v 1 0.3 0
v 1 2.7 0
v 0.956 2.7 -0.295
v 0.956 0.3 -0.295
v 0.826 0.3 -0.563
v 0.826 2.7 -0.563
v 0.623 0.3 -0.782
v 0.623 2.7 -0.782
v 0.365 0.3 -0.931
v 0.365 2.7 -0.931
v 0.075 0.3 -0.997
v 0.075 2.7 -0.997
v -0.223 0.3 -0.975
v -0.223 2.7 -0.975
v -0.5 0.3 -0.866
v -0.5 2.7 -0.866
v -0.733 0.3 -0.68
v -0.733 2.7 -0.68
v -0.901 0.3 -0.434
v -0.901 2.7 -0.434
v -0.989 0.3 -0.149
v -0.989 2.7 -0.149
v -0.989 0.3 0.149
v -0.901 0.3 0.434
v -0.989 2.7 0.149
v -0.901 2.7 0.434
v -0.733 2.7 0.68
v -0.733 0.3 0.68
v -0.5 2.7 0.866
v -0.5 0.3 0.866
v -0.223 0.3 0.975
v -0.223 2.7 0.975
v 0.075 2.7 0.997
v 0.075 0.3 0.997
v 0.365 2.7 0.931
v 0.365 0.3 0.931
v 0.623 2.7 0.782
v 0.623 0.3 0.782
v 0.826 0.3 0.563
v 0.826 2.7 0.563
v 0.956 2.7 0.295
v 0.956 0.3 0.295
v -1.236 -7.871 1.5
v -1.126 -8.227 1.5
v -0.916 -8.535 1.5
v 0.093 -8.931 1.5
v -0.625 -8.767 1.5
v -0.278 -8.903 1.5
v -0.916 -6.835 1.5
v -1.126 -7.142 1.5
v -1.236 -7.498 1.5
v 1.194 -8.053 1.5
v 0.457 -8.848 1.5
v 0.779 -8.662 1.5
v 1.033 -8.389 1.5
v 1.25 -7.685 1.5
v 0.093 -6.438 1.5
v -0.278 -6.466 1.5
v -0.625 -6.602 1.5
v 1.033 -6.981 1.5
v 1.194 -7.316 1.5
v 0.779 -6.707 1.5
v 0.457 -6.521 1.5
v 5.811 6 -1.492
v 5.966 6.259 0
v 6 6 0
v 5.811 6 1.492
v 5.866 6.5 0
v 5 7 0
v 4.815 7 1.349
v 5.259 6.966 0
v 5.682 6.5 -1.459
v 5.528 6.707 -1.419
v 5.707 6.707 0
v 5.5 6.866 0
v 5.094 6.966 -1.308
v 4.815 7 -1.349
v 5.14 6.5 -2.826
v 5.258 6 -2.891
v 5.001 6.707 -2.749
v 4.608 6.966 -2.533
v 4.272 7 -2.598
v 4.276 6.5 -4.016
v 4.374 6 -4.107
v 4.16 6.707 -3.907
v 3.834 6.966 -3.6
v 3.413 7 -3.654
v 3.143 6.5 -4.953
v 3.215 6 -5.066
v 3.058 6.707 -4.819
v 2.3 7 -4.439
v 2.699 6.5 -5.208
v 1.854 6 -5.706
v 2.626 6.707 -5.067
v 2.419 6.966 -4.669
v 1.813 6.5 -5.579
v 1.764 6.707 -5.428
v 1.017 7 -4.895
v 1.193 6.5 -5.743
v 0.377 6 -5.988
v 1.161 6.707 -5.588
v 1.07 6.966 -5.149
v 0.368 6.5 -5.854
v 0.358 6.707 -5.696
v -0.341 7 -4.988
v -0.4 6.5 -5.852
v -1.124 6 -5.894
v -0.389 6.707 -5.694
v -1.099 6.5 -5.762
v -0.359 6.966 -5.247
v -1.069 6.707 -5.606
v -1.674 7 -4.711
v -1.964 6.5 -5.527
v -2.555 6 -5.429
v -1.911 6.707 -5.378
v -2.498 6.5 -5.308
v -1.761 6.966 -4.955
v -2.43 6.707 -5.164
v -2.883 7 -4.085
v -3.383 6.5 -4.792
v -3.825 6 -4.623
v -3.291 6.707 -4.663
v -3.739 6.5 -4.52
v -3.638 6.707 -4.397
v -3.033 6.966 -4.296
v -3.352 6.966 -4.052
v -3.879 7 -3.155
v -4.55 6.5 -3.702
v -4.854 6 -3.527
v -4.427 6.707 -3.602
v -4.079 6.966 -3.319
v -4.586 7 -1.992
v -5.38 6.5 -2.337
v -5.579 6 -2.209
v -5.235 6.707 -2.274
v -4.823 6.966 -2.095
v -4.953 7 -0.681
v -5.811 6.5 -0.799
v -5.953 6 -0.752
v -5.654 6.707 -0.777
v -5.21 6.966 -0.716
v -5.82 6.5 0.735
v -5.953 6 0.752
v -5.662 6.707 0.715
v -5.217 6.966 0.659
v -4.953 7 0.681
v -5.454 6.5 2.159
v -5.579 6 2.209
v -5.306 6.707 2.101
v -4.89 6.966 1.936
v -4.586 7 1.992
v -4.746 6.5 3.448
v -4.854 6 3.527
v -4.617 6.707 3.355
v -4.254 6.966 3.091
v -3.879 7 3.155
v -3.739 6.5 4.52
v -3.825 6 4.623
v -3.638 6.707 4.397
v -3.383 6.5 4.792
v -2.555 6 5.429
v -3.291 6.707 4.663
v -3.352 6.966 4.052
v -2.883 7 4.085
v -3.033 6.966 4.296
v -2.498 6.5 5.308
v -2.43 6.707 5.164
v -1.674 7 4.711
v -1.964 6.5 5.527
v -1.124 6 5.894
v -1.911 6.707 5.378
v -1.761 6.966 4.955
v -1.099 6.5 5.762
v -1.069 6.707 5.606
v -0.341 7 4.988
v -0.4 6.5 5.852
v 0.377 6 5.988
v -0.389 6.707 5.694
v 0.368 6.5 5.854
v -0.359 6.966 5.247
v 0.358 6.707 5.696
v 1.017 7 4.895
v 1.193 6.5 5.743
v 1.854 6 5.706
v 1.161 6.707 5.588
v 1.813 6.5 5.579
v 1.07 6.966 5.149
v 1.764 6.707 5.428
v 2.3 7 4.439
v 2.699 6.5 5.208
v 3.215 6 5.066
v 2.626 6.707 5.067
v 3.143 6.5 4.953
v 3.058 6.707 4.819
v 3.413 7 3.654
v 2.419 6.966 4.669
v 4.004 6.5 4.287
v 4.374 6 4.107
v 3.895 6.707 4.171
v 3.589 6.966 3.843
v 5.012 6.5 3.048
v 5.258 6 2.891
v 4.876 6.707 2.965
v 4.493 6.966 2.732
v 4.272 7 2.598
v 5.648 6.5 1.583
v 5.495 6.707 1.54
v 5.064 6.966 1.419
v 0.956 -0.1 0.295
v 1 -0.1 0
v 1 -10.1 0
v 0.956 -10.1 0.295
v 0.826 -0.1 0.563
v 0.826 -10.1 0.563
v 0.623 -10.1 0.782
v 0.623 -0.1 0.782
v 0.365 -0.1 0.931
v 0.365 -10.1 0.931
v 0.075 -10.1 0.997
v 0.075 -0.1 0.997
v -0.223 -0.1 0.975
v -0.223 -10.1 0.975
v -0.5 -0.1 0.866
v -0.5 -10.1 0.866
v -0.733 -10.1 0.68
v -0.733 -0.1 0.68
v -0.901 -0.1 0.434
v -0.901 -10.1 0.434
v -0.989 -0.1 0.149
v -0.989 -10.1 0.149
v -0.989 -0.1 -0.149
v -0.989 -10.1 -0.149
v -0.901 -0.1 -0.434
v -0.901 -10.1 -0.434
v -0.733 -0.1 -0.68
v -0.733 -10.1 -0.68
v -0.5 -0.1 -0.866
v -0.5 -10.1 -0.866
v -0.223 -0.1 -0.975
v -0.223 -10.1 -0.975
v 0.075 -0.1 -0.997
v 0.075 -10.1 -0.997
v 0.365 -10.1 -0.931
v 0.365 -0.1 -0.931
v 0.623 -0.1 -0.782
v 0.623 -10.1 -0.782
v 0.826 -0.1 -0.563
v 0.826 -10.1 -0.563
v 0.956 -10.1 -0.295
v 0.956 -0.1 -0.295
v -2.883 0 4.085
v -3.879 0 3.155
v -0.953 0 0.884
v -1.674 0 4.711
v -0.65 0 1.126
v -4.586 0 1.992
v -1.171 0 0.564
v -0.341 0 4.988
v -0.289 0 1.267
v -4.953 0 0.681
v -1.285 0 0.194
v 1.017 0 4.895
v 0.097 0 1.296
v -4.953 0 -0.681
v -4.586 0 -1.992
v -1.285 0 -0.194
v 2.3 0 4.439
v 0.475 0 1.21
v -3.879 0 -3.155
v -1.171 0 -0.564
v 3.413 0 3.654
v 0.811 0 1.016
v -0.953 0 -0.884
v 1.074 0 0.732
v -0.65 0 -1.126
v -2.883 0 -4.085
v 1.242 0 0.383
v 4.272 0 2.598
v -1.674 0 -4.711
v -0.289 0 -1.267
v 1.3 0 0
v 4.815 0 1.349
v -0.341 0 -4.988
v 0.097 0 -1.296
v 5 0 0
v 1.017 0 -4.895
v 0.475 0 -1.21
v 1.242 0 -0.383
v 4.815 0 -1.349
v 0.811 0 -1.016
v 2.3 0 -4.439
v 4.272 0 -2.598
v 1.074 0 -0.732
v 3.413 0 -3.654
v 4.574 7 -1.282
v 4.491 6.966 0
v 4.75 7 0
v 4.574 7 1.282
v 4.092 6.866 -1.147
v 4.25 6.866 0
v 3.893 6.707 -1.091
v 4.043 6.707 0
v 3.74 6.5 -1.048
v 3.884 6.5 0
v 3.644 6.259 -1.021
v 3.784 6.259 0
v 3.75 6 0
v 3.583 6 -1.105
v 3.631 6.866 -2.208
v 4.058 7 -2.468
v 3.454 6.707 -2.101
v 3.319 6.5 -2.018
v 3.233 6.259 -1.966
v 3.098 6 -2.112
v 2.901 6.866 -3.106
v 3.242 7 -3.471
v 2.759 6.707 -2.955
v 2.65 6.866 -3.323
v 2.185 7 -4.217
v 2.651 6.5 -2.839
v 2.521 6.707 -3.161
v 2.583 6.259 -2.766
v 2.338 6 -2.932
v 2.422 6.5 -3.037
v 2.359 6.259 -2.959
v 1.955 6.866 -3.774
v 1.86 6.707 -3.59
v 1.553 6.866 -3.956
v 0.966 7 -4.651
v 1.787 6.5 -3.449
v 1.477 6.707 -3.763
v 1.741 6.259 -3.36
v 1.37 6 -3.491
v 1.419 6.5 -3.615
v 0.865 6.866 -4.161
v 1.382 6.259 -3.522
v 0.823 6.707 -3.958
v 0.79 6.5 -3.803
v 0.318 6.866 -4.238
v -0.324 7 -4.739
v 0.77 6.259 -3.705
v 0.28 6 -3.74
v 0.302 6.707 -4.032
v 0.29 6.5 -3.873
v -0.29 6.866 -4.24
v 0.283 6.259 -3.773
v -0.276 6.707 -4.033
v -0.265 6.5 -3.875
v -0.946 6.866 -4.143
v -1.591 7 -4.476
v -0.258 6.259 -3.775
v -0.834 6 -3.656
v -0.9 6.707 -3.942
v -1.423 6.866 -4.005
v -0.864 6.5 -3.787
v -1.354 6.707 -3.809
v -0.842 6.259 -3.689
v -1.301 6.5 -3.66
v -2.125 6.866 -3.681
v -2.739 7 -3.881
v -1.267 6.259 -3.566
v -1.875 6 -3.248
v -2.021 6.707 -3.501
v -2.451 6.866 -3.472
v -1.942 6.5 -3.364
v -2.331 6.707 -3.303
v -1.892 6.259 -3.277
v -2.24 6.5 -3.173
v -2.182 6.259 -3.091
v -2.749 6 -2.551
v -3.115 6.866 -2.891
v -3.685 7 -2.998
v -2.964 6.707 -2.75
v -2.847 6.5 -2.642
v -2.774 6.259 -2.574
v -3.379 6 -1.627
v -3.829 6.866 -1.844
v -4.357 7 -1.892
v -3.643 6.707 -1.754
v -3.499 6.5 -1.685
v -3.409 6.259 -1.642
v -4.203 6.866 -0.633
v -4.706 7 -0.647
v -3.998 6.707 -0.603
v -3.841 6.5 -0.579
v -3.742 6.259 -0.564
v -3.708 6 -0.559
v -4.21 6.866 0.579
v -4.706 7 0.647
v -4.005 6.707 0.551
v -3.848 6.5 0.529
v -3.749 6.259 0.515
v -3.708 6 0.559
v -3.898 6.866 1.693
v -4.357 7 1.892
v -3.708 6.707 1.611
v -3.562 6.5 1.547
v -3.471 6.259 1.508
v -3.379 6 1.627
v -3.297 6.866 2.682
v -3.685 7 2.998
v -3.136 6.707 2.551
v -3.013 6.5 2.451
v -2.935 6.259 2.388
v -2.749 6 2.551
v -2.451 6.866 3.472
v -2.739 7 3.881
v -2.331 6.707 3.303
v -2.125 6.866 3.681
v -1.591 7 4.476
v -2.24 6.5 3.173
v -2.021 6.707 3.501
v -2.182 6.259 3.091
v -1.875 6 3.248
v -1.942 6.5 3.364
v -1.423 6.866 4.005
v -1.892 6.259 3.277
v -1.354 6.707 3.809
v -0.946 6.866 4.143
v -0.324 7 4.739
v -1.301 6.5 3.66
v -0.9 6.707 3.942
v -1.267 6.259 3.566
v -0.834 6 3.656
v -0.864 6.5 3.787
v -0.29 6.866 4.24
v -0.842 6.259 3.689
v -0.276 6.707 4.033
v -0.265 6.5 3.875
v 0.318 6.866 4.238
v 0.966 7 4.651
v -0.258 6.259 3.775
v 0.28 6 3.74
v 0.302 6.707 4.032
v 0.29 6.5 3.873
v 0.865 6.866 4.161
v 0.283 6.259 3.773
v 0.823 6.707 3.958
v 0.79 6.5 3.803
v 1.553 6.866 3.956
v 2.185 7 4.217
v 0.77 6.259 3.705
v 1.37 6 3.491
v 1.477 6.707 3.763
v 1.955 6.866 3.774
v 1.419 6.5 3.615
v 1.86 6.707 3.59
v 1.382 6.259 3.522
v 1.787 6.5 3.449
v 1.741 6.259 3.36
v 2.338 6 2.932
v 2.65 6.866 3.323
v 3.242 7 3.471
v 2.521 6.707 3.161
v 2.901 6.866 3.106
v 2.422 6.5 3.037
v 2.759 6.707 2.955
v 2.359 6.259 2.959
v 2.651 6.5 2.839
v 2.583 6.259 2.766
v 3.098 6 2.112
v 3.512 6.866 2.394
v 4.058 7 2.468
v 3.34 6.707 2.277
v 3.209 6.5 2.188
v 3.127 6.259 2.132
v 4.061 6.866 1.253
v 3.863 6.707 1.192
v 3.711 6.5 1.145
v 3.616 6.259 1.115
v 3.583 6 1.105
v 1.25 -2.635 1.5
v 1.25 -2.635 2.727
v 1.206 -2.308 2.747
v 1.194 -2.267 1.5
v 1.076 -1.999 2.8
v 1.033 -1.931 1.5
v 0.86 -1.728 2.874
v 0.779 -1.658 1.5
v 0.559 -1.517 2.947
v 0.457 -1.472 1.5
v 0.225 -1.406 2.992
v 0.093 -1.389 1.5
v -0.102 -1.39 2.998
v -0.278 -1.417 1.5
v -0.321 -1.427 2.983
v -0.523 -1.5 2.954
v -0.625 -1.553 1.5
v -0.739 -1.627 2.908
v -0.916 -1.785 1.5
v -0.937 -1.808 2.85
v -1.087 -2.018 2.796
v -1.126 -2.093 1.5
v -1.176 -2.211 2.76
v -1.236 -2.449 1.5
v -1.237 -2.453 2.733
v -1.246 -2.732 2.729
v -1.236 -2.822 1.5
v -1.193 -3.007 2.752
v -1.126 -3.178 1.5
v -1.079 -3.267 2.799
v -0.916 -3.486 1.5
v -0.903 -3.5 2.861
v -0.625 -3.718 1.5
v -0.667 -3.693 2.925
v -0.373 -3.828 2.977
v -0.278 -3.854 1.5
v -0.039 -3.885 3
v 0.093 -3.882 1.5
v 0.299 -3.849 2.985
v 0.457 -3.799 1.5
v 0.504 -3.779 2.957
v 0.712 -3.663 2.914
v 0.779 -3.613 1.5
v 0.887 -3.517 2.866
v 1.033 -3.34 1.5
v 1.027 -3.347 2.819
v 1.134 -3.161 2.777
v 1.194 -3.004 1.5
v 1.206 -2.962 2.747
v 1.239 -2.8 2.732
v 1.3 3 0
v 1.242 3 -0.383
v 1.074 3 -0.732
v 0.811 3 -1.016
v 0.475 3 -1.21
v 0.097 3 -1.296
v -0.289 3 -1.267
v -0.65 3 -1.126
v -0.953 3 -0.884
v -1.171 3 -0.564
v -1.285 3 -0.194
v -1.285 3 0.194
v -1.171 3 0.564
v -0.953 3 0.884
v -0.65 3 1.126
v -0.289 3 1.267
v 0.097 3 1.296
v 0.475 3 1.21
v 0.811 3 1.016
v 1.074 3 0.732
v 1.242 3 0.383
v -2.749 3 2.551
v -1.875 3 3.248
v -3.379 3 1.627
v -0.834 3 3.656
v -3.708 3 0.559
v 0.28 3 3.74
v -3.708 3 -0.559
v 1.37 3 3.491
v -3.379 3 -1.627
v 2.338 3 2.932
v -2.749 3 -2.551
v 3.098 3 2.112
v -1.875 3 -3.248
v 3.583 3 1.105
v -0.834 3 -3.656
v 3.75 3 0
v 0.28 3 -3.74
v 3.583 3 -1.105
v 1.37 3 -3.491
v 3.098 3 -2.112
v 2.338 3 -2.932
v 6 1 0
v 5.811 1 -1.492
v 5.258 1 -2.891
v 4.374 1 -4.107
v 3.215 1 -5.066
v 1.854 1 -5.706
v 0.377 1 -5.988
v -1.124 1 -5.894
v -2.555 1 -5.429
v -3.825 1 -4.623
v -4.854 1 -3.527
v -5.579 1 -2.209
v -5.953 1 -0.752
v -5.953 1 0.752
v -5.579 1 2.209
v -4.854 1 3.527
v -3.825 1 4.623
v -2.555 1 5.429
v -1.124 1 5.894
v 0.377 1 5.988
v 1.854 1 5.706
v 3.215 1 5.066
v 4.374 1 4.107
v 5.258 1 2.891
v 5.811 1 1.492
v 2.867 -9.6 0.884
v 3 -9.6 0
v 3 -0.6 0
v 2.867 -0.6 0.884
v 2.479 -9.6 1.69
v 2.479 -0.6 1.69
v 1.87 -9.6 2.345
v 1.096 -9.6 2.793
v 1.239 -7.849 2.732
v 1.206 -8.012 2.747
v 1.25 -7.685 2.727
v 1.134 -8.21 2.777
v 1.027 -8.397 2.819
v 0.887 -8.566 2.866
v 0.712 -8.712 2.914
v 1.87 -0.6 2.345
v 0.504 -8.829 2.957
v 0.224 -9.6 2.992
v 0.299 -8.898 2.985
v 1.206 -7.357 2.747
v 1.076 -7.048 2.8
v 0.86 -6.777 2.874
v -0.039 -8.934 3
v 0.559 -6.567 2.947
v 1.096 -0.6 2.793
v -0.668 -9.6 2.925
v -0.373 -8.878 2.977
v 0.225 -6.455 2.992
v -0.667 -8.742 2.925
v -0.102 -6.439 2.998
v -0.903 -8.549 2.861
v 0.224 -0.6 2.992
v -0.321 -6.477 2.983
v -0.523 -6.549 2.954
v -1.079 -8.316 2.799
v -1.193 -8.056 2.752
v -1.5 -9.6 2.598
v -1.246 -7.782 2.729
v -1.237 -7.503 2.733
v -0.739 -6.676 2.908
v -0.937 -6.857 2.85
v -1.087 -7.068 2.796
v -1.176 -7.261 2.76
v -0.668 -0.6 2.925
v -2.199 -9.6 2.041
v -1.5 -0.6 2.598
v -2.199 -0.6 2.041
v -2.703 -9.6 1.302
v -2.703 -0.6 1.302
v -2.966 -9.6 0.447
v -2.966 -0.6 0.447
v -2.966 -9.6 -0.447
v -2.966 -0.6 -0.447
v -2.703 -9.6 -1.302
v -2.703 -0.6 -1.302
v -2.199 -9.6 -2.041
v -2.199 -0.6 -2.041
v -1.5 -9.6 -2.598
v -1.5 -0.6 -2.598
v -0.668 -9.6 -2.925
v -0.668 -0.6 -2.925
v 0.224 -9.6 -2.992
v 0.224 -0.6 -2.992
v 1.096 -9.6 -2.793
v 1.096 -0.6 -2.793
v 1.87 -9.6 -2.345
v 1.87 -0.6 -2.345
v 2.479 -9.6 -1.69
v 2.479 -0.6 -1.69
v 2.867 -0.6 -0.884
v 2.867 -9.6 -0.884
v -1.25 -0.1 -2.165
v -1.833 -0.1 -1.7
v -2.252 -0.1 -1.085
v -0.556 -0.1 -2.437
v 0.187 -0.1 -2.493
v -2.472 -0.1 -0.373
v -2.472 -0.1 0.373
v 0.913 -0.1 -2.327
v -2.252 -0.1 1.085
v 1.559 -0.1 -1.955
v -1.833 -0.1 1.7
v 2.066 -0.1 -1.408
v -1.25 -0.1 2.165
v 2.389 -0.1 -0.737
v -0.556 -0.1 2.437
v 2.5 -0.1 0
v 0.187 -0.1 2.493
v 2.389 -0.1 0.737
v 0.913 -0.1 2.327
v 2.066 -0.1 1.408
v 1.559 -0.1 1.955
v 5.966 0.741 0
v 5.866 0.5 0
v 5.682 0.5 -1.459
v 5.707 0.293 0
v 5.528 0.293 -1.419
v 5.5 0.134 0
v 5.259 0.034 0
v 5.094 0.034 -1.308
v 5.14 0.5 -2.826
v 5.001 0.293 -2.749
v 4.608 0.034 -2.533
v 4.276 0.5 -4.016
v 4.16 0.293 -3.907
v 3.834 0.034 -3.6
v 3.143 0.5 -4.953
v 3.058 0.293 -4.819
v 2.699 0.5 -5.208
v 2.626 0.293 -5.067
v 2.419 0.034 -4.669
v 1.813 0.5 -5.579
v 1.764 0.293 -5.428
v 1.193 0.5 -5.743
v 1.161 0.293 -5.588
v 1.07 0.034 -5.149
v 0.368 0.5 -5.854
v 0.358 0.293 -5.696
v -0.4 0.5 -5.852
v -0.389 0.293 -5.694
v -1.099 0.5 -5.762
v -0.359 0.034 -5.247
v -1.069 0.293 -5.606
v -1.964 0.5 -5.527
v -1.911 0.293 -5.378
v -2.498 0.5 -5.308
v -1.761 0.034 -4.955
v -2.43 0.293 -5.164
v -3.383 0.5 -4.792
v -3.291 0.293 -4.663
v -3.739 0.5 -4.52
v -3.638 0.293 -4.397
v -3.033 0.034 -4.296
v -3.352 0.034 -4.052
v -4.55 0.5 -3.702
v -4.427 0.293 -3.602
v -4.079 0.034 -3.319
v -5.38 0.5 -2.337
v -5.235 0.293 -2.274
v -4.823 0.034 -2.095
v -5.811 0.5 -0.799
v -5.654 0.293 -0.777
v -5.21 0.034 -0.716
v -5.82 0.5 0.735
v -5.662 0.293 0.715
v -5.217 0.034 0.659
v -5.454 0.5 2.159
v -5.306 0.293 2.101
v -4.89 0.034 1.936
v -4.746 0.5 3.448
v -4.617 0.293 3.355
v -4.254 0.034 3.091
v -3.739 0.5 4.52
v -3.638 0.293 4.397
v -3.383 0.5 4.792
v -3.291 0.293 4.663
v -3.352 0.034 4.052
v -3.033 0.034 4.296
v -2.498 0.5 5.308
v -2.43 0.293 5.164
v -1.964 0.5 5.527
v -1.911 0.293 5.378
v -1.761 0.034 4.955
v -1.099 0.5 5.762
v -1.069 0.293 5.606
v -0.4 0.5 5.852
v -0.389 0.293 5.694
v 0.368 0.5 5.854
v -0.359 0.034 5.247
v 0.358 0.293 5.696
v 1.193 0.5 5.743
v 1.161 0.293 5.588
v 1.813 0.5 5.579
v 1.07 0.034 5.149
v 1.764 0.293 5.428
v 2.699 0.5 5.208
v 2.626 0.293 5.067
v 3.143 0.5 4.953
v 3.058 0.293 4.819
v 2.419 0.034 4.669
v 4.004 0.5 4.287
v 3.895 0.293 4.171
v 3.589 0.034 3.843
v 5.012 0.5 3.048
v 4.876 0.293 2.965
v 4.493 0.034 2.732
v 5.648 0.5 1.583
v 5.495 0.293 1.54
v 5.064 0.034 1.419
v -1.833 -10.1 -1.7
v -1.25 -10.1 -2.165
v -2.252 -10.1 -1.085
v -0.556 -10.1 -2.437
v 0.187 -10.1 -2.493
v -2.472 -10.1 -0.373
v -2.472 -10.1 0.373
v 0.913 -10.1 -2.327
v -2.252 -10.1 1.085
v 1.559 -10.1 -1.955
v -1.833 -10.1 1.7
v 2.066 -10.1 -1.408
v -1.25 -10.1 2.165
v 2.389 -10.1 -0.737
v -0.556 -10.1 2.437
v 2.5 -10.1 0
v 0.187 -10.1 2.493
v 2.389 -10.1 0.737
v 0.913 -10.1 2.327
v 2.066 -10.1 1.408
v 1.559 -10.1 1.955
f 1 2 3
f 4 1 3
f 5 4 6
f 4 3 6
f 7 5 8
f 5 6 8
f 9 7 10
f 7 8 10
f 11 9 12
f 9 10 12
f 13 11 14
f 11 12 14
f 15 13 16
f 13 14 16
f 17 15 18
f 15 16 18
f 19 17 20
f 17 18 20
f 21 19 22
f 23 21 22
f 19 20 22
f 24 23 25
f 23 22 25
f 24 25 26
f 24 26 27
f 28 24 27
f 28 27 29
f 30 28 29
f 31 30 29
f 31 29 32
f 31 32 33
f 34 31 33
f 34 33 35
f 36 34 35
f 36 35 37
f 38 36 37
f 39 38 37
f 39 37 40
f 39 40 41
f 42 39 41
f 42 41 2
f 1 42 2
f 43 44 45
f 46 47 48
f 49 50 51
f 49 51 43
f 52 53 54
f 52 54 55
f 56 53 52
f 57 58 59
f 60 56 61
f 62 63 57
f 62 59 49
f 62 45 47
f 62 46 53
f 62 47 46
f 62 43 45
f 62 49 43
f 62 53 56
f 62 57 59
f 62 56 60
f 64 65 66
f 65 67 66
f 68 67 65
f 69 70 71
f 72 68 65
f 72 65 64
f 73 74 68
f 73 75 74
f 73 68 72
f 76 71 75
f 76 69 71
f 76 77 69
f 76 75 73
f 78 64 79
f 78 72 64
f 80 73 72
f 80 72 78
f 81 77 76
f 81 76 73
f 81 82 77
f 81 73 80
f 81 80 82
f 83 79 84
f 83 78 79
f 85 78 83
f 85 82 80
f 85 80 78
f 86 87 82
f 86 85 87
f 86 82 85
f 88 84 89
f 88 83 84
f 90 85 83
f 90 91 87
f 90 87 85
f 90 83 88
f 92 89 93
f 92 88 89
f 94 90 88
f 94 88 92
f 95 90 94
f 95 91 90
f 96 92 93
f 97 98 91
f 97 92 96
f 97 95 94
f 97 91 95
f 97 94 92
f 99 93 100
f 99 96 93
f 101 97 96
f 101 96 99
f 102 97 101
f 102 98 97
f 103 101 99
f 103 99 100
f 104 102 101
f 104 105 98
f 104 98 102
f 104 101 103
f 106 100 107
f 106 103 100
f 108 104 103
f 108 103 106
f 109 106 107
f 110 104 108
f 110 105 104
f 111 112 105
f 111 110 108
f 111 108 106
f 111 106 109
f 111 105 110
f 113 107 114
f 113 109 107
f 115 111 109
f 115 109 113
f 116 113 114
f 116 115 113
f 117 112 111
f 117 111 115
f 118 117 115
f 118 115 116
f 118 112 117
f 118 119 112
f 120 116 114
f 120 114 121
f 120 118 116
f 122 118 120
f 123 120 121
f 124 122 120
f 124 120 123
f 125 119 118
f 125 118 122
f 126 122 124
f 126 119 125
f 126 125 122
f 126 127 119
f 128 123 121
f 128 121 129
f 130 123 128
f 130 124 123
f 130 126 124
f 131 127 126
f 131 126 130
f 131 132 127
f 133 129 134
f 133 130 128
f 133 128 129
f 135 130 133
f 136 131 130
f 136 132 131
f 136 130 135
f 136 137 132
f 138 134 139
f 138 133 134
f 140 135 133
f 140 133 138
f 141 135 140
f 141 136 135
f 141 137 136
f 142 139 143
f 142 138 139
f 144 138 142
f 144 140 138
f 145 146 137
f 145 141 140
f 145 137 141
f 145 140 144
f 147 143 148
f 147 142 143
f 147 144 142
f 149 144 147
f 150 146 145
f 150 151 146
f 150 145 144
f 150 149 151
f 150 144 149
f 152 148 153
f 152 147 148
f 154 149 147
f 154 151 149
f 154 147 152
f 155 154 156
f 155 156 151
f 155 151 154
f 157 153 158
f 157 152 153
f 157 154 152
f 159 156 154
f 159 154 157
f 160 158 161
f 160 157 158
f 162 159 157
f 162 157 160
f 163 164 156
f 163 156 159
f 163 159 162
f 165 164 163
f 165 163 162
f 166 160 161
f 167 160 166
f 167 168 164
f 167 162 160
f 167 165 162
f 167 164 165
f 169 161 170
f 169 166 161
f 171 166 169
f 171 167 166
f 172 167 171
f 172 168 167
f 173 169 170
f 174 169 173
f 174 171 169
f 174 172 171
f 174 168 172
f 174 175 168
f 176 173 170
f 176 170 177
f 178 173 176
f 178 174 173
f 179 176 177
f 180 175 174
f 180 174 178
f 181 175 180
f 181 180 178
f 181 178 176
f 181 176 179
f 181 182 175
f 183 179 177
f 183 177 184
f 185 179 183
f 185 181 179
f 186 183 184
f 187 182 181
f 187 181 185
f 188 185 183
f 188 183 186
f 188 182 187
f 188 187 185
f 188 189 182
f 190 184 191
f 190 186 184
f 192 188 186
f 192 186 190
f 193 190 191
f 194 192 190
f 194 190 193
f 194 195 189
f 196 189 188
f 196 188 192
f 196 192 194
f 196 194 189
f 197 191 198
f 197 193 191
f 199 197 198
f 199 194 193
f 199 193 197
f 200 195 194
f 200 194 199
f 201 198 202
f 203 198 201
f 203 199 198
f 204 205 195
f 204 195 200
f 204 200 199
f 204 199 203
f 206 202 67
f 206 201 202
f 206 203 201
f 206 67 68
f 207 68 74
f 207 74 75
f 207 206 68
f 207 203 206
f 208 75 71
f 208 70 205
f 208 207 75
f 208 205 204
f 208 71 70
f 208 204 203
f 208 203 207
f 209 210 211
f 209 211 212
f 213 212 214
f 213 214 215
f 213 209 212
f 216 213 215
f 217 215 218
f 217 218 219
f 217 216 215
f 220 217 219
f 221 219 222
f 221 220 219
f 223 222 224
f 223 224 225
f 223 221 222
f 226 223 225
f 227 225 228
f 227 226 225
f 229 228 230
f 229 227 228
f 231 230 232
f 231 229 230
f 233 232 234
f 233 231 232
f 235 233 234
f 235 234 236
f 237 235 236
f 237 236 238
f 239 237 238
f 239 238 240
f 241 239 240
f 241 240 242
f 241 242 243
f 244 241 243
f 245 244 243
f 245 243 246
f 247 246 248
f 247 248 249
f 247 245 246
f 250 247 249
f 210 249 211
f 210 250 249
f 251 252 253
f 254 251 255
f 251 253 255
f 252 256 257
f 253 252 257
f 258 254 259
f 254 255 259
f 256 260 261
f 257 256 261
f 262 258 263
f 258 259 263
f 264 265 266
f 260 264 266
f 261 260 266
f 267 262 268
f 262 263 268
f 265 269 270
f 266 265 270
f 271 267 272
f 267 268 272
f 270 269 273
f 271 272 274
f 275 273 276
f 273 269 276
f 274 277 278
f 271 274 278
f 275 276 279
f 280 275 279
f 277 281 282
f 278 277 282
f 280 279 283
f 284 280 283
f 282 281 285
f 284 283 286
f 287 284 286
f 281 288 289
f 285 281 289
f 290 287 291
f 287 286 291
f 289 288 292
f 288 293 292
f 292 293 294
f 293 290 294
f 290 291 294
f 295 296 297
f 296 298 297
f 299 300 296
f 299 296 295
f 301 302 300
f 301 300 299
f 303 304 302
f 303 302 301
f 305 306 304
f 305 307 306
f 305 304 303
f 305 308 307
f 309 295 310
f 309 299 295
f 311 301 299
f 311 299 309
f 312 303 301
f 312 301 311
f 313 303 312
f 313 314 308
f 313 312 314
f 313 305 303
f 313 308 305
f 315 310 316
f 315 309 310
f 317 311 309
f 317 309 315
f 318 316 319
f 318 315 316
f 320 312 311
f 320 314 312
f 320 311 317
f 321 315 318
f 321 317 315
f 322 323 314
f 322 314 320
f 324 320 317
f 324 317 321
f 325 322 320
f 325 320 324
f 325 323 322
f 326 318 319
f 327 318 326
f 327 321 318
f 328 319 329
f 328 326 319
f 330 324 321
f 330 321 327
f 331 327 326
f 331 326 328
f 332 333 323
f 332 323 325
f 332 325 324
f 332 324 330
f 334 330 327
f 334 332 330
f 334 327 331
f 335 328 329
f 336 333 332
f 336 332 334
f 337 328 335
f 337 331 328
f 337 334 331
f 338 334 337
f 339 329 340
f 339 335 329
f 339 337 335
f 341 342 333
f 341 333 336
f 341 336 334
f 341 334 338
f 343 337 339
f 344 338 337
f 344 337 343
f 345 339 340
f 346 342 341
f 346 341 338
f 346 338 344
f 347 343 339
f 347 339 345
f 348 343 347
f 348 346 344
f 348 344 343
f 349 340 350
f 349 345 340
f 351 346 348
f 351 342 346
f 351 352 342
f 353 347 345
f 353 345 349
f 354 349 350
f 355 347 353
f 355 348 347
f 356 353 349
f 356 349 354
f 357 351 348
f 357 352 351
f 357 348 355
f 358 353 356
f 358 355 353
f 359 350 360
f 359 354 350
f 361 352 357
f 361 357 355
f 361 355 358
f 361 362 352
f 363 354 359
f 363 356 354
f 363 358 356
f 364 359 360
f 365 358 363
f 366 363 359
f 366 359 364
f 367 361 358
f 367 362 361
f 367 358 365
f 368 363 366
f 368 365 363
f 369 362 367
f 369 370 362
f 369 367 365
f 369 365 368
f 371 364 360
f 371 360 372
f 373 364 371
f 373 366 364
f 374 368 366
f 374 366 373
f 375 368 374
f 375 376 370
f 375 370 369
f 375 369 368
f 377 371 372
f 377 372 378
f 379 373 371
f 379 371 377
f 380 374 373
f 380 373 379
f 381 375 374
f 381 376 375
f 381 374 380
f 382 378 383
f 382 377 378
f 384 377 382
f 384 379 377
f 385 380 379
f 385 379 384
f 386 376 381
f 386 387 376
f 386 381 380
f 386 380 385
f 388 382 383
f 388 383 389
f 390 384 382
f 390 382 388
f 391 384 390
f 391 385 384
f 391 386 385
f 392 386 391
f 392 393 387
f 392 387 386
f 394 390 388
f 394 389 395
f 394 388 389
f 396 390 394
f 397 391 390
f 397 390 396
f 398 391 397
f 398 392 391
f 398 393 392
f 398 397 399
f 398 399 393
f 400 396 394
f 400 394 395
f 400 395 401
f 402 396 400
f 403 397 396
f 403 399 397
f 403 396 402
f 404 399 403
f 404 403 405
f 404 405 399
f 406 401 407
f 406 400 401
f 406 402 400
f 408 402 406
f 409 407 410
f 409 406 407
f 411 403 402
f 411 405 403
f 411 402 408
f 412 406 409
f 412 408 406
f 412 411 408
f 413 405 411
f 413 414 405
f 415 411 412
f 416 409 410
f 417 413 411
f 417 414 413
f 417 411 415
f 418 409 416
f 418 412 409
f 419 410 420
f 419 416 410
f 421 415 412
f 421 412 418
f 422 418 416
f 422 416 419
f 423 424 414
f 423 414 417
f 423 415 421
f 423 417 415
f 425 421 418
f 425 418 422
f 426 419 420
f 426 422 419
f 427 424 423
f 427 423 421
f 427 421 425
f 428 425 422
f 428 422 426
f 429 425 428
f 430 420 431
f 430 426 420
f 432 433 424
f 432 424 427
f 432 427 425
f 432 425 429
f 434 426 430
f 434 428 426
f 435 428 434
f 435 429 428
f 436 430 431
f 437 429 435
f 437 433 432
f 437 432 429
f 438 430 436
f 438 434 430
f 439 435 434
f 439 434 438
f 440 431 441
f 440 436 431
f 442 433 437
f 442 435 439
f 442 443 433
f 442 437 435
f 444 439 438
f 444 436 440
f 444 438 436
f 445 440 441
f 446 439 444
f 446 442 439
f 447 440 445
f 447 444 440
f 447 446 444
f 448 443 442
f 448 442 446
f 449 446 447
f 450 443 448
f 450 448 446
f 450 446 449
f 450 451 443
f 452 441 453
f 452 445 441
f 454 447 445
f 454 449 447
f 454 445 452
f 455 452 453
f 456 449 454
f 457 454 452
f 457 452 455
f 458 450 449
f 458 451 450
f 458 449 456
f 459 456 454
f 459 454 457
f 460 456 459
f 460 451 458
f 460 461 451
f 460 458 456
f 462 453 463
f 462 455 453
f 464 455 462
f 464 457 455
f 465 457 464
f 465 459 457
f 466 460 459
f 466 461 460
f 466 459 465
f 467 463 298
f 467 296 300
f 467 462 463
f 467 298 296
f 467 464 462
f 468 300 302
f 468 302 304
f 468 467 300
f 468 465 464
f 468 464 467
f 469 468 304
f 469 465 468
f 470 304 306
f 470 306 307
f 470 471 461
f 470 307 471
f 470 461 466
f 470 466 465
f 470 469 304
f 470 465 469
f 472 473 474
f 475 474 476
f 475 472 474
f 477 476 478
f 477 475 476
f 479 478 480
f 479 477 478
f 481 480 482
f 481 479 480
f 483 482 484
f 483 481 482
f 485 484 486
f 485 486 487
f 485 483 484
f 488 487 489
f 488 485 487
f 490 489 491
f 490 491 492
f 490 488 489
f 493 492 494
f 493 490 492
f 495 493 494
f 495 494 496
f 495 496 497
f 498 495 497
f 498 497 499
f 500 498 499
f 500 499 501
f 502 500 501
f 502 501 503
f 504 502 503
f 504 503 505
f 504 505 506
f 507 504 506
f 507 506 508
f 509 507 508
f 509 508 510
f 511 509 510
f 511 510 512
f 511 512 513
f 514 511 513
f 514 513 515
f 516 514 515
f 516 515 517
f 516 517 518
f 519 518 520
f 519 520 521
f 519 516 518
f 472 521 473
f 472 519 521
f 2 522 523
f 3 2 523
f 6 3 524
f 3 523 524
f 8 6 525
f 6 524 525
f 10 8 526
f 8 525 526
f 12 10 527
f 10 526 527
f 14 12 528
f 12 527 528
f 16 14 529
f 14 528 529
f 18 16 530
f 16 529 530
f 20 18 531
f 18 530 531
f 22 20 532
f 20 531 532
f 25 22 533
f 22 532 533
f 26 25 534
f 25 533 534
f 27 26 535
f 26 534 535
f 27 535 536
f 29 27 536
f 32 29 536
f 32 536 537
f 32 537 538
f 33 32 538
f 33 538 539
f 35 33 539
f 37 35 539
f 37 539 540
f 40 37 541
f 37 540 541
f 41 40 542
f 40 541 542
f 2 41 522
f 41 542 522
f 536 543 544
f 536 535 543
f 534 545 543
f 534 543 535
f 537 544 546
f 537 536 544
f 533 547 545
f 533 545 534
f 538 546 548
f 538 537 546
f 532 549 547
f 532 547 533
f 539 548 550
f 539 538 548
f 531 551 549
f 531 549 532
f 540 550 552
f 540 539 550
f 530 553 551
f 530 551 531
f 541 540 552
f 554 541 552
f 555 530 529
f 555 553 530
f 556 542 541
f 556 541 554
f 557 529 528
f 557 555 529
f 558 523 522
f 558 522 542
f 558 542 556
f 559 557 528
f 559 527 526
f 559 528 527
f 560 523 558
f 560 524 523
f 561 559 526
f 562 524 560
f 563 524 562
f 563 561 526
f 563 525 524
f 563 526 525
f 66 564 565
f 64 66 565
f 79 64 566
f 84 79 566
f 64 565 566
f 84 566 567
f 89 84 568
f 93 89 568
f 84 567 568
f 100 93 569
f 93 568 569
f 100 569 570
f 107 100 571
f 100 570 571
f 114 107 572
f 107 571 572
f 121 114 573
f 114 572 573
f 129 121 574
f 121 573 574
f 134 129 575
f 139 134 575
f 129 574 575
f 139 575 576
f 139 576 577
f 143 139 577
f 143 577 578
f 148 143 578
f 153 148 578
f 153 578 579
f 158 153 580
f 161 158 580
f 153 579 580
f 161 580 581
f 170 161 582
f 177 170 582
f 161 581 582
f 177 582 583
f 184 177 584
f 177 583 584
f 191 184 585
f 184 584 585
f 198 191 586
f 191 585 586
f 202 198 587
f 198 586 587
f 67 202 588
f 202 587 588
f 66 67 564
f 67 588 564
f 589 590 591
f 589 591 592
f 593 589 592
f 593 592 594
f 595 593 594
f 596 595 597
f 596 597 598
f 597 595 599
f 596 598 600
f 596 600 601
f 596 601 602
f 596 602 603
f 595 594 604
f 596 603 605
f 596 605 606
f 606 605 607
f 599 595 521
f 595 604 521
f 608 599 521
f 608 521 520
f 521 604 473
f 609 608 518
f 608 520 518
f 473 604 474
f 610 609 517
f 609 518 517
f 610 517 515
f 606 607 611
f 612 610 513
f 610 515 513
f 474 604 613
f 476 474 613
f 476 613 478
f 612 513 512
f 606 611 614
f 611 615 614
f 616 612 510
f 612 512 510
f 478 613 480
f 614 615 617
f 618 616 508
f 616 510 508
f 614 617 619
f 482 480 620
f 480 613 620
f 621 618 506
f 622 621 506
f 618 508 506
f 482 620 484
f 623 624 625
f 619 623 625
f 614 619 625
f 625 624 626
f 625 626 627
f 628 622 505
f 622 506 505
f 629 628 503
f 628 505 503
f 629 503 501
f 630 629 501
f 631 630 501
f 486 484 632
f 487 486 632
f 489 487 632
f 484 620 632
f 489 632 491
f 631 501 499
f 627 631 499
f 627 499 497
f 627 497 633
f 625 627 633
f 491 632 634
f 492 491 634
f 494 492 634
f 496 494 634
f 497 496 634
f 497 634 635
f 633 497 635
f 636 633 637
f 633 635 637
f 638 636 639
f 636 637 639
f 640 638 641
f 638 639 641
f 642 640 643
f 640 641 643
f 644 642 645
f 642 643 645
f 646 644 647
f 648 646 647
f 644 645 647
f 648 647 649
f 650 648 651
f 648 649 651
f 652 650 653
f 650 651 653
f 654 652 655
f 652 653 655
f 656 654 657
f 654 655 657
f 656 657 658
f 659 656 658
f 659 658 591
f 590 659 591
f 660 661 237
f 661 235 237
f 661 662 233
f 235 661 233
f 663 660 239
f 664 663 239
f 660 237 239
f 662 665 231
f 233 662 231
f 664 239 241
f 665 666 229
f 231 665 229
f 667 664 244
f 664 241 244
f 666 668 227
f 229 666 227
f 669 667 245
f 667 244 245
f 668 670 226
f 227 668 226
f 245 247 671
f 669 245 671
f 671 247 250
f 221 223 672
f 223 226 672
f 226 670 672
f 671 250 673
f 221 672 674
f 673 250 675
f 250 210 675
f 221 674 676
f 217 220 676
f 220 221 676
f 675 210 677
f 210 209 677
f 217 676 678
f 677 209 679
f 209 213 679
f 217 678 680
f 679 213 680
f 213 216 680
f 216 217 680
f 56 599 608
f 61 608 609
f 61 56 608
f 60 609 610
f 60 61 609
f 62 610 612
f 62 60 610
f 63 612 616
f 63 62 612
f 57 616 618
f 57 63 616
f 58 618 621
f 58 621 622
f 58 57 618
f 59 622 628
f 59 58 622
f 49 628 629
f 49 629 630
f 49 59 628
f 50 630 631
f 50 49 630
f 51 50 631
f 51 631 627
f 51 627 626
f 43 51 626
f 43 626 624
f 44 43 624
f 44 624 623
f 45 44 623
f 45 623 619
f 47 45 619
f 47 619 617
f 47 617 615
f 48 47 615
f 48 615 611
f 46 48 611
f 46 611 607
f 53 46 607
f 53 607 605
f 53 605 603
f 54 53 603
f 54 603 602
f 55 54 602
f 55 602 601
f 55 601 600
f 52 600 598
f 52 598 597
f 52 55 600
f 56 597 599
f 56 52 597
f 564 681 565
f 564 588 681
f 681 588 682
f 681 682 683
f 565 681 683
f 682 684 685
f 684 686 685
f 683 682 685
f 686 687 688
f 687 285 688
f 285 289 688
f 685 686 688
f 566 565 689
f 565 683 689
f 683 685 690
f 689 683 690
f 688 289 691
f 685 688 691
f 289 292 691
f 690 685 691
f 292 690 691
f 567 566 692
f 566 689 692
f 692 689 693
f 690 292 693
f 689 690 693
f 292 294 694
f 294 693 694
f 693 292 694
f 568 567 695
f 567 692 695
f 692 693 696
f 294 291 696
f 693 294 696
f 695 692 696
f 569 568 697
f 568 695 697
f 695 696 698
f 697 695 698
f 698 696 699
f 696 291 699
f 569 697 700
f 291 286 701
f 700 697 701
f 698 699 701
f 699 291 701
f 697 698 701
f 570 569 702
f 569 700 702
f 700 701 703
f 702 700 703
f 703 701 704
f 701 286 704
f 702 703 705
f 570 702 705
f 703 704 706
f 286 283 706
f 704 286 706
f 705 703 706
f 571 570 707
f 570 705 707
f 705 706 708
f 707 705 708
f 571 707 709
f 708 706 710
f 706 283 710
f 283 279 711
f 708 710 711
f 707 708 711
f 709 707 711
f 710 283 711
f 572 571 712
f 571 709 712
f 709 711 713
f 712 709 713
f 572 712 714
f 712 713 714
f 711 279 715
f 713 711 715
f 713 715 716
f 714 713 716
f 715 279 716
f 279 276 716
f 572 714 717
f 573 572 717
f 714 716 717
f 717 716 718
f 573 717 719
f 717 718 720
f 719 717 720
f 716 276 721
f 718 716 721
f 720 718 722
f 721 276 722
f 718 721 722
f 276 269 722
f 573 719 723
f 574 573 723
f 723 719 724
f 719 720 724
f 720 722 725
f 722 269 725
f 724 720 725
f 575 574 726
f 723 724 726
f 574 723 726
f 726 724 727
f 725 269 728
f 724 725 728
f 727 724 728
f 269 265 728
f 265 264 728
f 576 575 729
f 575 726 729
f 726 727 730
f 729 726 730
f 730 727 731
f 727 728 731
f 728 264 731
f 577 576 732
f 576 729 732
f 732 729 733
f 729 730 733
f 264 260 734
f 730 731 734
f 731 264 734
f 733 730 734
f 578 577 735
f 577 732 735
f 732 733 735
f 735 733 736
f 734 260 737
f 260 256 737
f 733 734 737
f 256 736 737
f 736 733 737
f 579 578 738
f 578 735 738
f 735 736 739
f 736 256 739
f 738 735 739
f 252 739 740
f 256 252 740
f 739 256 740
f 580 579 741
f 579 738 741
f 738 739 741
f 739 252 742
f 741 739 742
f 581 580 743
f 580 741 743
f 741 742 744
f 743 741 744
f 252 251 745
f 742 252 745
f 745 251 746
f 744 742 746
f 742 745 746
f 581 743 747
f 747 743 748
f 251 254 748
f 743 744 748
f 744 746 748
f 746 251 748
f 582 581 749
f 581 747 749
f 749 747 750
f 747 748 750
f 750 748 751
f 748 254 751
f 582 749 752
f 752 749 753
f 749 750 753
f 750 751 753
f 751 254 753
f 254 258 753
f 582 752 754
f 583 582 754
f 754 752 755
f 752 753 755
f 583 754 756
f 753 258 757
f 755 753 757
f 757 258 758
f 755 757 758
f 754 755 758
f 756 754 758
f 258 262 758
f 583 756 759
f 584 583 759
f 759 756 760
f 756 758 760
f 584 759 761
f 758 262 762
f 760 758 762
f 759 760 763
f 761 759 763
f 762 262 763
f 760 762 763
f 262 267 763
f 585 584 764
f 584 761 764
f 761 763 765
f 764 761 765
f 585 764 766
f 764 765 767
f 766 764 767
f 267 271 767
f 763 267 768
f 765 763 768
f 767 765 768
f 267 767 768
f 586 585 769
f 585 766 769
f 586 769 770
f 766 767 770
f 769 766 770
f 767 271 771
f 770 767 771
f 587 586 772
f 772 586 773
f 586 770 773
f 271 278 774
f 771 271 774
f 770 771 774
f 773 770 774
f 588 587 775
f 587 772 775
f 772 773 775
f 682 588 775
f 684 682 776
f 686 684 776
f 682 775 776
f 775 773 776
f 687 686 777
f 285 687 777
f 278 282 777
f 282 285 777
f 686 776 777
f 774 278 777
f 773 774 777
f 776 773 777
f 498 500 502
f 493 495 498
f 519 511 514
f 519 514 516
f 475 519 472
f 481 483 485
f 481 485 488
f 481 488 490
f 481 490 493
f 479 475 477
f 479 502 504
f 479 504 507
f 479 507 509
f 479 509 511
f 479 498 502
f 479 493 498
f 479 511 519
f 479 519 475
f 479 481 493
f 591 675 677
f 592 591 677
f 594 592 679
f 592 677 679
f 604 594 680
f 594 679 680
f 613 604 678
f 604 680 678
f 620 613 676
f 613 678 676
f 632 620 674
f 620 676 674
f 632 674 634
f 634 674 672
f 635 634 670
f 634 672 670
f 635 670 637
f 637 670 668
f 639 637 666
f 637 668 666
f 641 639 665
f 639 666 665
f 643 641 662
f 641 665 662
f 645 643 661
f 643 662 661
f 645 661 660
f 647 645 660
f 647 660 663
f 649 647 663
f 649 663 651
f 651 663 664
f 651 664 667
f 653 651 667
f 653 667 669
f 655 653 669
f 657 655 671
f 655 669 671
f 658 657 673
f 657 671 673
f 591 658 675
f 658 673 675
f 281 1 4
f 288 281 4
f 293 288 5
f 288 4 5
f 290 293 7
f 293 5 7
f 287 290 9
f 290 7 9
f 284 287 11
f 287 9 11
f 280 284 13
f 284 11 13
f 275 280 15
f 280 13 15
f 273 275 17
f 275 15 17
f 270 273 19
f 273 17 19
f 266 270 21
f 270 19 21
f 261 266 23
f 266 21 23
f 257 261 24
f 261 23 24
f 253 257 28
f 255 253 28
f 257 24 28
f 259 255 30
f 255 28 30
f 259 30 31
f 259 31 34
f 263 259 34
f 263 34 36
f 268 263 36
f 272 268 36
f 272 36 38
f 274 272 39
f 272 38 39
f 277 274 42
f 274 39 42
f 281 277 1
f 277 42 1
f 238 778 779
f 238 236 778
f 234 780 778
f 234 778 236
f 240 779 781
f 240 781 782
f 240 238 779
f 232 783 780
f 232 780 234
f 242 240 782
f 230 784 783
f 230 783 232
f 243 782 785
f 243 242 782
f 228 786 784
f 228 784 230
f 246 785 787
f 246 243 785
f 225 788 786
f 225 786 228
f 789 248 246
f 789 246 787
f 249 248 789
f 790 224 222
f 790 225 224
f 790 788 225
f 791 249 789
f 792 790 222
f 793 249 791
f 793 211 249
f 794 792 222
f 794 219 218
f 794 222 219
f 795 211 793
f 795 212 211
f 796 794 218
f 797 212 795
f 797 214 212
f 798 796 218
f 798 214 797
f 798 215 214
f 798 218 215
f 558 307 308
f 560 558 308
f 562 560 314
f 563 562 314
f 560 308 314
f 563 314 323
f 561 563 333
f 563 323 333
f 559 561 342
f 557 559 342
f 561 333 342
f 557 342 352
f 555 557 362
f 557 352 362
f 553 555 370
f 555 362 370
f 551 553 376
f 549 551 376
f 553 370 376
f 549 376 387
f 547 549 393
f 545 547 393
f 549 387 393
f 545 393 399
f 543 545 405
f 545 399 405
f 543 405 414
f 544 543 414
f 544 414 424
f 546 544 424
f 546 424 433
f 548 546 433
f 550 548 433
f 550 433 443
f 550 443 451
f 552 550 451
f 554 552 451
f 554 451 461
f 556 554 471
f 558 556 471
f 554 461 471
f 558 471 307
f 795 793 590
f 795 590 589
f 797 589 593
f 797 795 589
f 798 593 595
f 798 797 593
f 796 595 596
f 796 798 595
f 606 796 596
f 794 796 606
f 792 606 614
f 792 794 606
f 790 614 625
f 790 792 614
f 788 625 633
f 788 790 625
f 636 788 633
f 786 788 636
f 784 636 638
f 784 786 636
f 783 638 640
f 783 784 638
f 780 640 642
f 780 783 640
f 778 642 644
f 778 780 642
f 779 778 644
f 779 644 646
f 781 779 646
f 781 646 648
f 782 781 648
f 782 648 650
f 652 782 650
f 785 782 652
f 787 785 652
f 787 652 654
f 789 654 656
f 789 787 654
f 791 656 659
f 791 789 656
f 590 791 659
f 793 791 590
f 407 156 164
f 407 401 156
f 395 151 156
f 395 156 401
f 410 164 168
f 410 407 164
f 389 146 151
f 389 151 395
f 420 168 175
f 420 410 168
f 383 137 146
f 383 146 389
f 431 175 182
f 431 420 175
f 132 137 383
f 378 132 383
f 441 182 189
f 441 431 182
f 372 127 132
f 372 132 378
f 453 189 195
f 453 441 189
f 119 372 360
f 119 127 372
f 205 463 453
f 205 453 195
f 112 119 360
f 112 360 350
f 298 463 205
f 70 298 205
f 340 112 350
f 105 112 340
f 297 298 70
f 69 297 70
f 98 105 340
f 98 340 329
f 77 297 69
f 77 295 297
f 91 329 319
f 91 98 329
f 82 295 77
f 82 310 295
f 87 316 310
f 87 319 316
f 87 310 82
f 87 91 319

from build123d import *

# Parameters (mm, degrees)
SKIZZE1_R                       = 6
AUFSATZ_LINEAR_AUSTRAGEN1_DEPTH = 7
SKIZZE2_R                       = 3.75
SCHNITT_LINEAR_AUSTRAGEN1_DEPTH = 4
SKIZZE3_R                       = 1
SCHNITT_LINEAR_AUSTRAGEN2_DEPTH = 4
AUFSATZ_LINEAR_START            = 0.1
SKIZZE5_R                       = 3
SKIZZE5_R_2                     = 1
AUFSATZ_LINEAR_AUSTRAGEN2_DEPTH = 10
SCHNITT_LINEAR_START            = 1.5
SKIZZE6_R                       = 1.25
SCHNITT_LINEAR_AUSTRAGEN3_DEPTH = 10
VERRUNDUNG1_R                   = 1
FASE1_SIZE                      = 0.5
FASE2_SIZE                      = 0.3


with BuildPart() as part:
    # Skizze1 → Aufsatz-Linear austragen1 (new body)
    with BuildSketch(Plane(origin=(0, 0, 0), x_dir=(1, 0, 0), z_dir=(0, 1, 0))):
        Circle(SKIZZE1_R)
    extrude(amount=AUFSATZ_LINEAR_AUSTRAGEN1_DEPTH)

    # Skizze2 → Schnitt-Linear austragen1 (cut)
    with BuildSketch(Plane(origin=(0, 7, 0), x_dir=(1, 0, 0), z_dir=(0, 1, 0))):
        Circle(SKIZZE2_R)
    extrude(amount=-SCHNITT_LINEAR_AUSTRAGEN1_DEPTH, mode=Mode.SUBTRACT)

    # Skizze3 → Schnitt-Linear austragen2 (cut)
    with BuildSketch(Plane(origin=(0, 3, 0), x_dir=(1, 0, 0), z_dir=(0, 1, 0))):
        Circle(SKIZZE3_R)
    extrude(amount=-SCHNITT_LINEAR_AUSTRAGEN2_DEPTH, mode=Mode.SUBTRACT)

    # Verrundung1
    verrundung1_edges = [part.edges().sort_by_distance(p)[0] for p in [
        (-6, 0, 0),
        (-6, 7, 0),
        (-3.75, 7, 0),
    ]]
    fillet(verrundung1_edges, radius=VERRUNDUNG1_R)

    # Fase2
    fase2_edges = [part.edges().sort_by_distance(p)[0] for p in [
        (-1, 0, 0),
        (-1, 3, 0),
    ]]
    chamfer(fase2_edges, length=FASE2_SIZE)


with BuildPart() as body_2:
    # Skizze5 → Aufsatz-Linear austragen2 (new body)
    with BuildSketch(Plane.XZ.offset(AUFSATZ_LINEAR_START)):
        Circle(SKIZZE5_R)
        Circle(SKIZZE5_R_2, mode=Mode.SUBTRACT)
    extrude(amount=AUFSATZ_LINEAR_AUSTRAGEN2_DEPTH)

    # Skizze6 → Schnitt-Linear austragen3 (cut)
    with BuildSketch(Plane.XY.offset(SCHNITT_LINEAR_START)):
        with Locations((0, -2.635386332)):
            Circle(SKIZZE6_R)
        with Locations((0, -7.684738109)):
            Circle(SKIZZE6_R)
    extrude(amount=SCHNITT_LINEAR_AUSTRAGEN3_DEPTH, mode=Mode.SUBTRACT)

    # Fase1
    fase1_edges = [body_2.edges().sort_by_distance(p)[0] for p in [
        (-3, -0.1, 0),
        (-3, -10.1, 0),
    ]]
    chamfer(fase1_edges, length=FASE1_SIZE)


solid = Compound([part.part, body_2.part])
